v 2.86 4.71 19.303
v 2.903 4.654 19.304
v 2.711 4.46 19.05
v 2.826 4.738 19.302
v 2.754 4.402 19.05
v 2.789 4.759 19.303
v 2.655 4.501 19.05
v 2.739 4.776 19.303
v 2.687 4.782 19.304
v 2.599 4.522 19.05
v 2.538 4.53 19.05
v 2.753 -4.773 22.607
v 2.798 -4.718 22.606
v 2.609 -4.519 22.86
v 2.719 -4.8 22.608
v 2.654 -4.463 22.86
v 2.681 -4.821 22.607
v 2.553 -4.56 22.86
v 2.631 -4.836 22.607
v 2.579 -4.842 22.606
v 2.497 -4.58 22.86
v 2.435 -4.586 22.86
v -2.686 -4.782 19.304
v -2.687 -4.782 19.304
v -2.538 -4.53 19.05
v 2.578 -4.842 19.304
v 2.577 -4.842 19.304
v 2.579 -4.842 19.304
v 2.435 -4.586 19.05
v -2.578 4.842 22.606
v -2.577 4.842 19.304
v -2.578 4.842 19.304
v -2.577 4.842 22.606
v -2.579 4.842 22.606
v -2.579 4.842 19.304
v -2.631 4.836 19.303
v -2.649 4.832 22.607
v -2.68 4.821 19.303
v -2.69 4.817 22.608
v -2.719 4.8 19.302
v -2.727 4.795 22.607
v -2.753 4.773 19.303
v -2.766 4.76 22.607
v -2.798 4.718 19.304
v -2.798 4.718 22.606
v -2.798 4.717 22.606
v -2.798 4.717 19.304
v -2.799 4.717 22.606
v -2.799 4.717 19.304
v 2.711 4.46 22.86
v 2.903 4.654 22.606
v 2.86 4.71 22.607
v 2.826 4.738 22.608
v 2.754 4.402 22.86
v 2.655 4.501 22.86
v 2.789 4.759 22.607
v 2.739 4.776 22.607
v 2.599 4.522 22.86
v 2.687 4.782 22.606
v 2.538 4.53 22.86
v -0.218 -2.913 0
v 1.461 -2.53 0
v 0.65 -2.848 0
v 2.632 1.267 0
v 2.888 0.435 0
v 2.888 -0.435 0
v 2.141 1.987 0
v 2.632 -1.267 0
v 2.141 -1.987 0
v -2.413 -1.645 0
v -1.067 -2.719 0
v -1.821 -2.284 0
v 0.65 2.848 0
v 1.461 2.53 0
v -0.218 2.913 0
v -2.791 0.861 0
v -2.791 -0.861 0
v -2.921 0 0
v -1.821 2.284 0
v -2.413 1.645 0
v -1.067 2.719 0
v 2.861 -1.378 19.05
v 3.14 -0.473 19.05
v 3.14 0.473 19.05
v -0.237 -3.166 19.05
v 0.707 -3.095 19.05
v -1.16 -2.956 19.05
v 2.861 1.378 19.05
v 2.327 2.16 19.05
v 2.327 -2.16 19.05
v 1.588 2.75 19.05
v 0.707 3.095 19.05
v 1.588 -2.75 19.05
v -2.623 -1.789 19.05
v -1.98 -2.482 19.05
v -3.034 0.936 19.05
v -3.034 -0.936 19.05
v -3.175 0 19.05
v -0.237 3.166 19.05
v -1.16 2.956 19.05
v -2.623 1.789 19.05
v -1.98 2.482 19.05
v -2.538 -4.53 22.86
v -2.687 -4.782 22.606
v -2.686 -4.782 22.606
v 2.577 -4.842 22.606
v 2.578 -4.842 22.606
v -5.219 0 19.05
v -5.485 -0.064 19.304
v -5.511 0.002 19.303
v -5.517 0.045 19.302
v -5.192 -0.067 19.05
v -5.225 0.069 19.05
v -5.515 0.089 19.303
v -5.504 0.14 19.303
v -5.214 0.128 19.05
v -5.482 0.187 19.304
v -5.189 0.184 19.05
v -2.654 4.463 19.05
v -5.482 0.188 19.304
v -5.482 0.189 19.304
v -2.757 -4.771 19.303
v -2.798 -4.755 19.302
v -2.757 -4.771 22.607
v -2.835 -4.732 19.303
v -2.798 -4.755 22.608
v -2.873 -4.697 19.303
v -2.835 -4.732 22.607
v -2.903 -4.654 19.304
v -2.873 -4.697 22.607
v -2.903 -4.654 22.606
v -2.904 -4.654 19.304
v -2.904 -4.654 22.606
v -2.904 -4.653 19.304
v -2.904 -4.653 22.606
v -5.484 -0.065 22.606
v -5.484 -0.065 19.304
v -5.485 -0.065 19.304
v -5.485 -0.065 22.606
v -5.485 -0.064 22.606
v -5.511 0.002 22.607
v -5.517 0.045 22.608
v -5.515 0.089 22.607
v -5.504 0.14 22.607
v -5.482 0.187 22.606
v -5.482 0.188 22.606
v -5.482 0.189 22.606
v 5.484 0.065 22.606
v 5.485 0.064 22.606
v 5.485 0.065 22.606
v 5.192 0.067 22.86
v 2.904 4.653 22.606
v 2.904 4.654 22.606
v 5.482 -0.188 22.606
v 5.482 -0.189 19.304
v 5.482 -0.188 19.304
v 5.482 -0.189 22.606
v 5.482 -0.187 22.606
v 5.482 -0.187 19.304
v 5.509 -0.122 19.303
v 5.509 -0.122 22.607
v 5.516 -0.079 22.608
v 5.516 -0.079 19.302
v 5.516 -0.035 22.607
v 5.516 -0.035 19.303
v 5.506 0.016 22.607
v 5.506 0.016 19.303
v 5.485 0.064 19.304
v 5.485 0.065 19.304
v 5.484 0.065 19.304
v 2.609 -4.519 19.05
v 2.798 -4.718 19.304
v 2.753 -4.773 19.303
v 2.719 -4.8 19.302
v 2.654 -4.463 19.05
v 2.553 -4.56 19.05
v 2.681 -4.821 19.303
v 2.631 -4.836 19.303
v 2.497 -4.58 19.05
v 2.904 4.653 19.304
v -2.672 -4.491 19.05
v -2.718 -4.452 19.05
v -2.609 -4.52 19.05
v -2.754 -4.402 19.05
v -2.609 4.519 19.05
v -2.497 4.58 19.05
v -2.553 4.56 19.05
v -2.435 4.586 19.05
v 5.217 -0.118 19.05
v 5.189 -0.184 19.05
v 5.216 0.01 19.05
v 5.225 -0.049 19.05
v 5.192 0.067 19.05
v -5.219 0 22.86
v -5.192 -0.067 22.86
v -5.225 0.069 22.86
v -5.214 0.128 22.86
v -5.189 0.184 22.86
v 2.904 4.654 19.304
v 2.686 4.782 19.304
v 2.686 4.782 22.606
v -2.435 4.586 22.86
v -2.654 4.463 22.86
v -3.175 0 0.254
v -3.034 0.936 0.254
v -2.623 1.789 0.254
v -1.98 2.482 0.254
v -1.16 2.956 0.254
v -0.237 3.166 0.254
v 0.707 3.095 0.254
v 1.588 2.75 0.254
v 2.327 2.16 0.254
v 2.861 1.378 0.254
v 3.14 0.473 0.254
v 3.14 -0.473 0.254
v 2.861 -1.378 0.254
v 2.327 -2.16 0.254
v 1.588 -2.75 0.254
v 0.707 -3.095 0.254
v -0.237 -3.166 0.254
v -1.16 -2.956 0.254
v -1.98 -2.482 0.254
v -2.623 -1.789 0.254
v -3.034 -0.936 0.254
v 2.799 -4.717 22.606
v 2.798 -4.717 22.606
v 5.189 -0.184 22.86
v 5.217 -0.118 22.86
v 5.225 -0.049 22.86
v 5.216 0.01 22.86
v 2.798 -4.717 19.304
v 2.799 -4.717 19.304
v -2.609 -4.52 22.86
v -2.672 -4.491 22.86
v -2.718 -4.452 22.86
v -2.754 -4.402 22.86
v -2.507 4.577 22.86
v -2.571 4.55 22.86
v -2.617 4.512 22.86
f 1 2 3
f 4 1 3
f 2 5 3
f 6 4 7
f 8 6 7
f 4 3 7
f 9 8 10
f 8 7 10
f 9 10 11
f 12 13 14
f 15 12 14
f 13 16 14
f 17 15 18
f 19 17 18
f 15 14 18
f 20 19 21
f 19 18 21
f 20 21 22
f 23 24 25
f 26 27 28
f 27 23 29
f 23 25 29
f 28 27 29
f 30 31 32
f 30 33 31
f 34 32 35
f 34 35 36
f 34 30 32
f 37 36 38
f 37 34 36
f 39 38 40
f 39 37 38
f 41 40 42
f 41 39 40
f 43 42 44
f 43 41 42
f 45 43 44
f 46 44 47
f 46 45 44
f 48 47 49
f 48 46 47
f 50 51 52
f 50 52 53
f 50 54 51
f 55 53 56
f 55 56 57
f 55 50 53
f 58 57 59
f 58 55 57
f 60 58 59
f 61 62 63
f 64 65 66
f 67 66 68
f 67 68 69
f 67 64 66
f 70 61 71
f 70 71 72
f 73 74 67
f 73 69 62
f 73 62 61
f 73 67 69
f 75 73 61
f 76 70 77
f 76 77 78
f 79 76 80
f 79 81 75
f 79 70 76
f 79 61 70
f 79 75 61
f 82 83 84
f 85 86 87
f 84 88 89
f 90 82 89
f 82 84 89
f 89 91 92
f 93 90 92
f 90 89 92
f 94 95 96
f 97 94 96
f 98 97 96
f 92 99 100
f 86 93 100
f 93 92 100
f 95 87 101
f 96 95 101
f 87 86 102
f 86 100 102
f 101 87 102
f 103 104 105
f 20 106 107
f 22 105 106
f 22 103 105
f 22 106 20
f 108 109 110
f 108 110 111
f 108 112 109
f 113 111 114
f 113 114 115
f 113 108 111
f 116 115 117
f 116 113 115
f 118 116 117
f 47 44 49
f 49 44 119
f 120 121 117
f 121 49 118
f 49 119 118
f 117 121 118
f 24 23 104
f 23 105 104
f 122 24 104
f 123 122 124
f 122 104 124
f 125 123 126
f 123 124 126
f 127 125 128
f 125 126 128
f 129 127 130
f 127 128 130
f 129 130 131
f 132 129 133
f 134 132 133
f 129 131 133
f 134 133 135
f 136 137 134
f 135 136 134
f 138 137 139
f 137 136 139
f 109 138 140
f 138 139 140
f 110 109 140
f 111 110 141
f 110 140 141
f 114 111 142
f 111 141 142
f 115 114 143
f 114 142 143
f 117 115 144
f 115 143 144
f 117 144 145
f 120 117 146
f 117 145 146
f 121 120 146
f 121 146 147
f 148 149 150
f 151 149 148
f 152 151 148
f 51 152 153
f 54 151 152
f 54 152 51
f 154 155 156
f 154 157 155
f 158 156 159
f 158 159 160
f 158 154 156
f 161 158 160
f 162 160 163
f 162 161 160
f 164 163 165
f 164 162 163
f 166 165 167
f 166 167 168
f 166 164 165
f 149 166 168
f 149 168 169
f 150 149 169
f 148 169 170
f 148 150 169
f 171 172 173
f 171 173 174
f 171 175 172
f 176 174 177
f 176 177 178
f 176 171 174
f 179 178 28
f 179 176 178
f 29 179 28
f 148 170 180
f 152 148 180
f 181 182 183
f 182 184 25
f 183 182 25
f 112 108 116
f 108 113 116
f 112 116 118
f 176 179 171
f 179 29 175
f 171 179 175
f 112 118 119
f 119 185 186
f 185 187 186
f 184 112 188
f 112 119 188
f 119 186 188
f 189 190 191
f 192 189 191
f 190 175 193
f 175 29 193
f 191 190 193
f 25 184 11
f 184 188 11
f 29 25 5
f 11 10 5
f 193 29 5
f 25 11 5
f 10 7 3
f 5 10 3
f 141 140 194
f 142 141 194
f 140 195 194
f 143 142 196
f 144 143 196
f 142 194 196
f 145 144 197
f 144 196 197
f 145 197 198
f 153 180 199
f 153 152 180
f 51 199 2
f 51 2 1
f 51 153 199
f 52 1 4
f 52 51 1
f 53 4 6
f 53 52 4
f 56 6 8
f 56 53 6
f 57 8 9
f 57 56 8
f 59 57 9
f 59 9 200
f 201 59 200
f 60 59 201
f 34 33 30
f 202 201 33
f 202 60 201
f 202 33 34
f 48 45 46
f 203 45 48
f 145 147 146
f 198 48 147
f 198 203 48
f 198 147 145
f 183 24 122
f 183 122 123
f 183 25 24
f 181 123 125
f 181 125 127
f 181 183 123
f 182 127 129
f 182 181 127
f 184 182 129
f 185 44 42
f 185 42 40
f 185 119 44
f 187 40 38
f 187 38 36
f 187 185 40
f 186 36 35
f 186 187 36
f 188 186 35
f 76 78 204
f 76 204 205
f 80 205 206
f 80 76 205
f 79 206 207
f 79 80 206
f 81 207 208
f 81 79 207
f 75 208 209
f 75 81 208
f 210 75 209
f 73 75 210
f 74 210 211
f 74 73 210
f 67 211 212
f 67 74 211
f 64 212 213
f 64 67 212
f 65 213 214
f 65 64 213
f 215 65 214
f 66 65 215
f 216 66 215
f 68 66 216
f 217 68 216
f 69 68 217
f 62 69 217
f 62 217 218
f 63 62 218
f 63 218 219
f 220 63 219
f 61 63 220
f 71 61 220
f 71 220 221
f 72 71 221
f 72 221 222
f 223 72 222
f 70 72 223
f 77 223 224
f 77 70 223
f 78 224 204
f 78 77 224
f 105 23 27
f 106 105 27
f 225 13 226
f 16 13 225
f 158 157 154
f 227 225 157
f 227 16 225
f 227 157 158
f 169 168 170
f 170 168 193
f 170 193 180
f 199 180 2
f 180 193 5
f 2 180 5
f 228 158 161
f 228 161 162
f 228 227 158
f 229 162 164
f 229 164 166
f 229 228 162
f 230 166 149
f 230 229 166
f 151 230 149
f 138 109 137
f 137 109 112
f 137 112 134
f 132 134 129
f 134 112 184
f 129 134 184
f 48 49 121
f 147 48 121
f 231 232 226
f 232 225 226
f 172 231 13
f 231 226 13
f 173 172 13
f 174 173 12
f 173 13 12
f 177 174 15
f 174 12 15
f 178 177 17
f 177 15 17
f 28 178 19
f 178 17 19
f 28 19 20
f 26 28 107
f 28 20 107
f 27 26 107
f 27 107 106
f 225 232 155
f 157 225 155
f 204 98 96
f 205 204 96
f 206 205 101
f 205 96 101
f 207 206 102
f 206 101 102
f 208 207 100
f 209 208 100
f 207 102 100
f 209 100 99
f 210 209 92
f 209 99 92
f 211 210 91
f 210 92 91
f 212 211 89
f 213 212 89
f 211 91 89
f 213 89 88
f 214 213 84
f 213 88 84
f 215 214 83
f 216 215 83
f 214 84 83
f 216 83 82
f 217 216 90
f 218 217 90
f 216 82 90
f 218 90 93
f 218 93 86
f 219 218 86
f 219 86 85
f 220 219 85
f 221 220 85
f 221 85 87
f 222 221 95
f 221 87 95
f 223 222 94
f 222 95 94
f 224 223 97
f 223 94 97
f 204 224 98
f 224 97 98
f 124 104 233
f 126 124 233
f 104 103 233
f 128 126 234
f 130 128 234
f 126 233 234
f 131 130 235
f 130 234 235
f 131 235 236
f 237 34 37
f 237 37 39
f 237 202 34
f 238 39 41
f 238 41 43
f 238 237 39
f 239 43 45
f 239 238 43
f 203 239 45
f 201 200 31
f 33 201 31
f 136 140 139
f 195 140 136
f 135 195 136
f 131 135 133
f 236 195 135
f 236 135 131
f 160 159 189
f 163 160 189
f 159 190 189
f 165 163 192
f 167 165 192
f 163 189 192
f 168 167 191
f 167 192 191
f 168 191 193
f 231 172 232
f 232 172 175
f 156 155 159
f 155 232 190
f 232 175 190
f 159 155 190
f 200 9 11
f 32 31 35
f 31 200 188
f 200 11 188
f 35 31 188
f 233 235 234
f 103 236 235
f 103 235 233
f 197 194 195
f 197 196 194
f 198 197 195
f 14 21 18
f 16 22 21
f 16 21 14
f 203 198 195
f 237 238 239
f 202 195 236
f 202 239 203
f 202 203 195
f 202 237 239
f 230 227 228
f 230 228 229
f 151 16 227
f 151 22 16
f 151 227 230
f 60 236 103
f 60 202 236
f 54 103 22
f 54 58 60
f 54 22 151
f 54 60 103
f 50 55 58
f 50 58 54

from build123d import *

# Parameters (mm, degrees)
F0_W     = 3.175
F0_H     = 19.05
F3_DEPTH = 3.81
F4_SIZE  = 0.254
F5_R     = 0.254
F6_R     = 0.3556
F7_R     = 0.3556
F8_SIZE  = 0.254


with BuildPart() as f1:
    # F0 (on Front) → F1 (revolve)
    with BuildSketch(Plane.XZ):
        with Locations((-1.5875, 9.525)):
            Rectangle(F0_W, F0_H)
    revolve(axis=Axis((0, 0, 9.525), (0, 0, -1)))

    # F8
    f8_edges = [f1.edges().sort_by_distance(p)[0] for p in [
        (3.175, 0, 0),
    ]]
    chamfer(f8_edges, length=F8_SIZE)


with BuildPart() as f3:
    # F2 (on face) → F3 (new body)
    with BuildSketch(Plane.XY.offset(19.05)):
        Polygon((2.7239143667, -4.8431521735), (5.55625, -0.0625970475), (2.8323356333, 4.780555126), (-2.7239143667, 4.8431521735), (-5.55625, 0.0625970475), (-2.8323356333, -4.780555126), align=None)
    extrude(amount=F3_DEPTH)

    # F4
    f4_edges = [f3.edges().sort_by_distance(p)[0] for p in [
        (-4.140082, 2.452875, 22.86),
        (-0.054211, -4.811854, 22.86),
        (-4.194293, -2.358979, 19.05),
        (-4.194293, -2.358979, 22.86),
        (0.054211, 4.811854, 22.86),
        (4.194293, 2.358979, 22.86),
        (4.140082, -2.452875, 22.86),
        (-4.140082, 2.452875, 19.05),
        (0.054211, 4.811854, 19.05),
        (4.194293, 2.358979, 19.05),
        (4.140082, -2.452875, 19.05),
        (-0.054211, -4.811854, 19.05),
    ]]
    chamfer(f4_edges, length=F4_SIZE)

    # F5
    f5_edges = [f3.edges().sort_by_distance(p)[0] for p in [
        (-2.832336, -4.780555, 20.955),
        (2.723914, -4.843152, 20.955),
        (-5.55625, 0.062597, 20.955),
        (-2.723914, 4.843152, 20.955),
        (2.832336, 4.780555, 20.955),
        (5.55625, -0.062597, 20.955),
    ]]
    fillet(f5_edges, radius=F5_R)

    # F6
    f6_edges = [f3.edges().sort_by_distance(p)[0] for p in [
        (-5.389967, 0.060724, 22.750015),
        (-2.642395, 4.69821, 22.750015),
        (2.747572, 4.637486, 22.750015),
        (5.389967, -0.060724, 22.750015),
        (2.642395, -4.69821, 22.750015),
        (-2.747572, -4.637486, 22.750015),
    ]]
    fillet(f6_edges, radius=F6_R)

    # F7
    f7_edges = [f3.edges().sort_by_distance(p)[0] for p in [
        (-2.747572, -4.637486, 19.159985),
        (-5.389967, 0.060724, 19.159985),
        (-2.642395, 4.69821, 19.159985),
        (2.747572, 4.637486, 19.159985),
        (5.389967, -0.060724, 19.159985),
        (2.642395, -4.69821, 19.159985),
    ]]
    fillet(f7_edges, radius=F7_R)


solid = Compound([f1.part, f3.part])
